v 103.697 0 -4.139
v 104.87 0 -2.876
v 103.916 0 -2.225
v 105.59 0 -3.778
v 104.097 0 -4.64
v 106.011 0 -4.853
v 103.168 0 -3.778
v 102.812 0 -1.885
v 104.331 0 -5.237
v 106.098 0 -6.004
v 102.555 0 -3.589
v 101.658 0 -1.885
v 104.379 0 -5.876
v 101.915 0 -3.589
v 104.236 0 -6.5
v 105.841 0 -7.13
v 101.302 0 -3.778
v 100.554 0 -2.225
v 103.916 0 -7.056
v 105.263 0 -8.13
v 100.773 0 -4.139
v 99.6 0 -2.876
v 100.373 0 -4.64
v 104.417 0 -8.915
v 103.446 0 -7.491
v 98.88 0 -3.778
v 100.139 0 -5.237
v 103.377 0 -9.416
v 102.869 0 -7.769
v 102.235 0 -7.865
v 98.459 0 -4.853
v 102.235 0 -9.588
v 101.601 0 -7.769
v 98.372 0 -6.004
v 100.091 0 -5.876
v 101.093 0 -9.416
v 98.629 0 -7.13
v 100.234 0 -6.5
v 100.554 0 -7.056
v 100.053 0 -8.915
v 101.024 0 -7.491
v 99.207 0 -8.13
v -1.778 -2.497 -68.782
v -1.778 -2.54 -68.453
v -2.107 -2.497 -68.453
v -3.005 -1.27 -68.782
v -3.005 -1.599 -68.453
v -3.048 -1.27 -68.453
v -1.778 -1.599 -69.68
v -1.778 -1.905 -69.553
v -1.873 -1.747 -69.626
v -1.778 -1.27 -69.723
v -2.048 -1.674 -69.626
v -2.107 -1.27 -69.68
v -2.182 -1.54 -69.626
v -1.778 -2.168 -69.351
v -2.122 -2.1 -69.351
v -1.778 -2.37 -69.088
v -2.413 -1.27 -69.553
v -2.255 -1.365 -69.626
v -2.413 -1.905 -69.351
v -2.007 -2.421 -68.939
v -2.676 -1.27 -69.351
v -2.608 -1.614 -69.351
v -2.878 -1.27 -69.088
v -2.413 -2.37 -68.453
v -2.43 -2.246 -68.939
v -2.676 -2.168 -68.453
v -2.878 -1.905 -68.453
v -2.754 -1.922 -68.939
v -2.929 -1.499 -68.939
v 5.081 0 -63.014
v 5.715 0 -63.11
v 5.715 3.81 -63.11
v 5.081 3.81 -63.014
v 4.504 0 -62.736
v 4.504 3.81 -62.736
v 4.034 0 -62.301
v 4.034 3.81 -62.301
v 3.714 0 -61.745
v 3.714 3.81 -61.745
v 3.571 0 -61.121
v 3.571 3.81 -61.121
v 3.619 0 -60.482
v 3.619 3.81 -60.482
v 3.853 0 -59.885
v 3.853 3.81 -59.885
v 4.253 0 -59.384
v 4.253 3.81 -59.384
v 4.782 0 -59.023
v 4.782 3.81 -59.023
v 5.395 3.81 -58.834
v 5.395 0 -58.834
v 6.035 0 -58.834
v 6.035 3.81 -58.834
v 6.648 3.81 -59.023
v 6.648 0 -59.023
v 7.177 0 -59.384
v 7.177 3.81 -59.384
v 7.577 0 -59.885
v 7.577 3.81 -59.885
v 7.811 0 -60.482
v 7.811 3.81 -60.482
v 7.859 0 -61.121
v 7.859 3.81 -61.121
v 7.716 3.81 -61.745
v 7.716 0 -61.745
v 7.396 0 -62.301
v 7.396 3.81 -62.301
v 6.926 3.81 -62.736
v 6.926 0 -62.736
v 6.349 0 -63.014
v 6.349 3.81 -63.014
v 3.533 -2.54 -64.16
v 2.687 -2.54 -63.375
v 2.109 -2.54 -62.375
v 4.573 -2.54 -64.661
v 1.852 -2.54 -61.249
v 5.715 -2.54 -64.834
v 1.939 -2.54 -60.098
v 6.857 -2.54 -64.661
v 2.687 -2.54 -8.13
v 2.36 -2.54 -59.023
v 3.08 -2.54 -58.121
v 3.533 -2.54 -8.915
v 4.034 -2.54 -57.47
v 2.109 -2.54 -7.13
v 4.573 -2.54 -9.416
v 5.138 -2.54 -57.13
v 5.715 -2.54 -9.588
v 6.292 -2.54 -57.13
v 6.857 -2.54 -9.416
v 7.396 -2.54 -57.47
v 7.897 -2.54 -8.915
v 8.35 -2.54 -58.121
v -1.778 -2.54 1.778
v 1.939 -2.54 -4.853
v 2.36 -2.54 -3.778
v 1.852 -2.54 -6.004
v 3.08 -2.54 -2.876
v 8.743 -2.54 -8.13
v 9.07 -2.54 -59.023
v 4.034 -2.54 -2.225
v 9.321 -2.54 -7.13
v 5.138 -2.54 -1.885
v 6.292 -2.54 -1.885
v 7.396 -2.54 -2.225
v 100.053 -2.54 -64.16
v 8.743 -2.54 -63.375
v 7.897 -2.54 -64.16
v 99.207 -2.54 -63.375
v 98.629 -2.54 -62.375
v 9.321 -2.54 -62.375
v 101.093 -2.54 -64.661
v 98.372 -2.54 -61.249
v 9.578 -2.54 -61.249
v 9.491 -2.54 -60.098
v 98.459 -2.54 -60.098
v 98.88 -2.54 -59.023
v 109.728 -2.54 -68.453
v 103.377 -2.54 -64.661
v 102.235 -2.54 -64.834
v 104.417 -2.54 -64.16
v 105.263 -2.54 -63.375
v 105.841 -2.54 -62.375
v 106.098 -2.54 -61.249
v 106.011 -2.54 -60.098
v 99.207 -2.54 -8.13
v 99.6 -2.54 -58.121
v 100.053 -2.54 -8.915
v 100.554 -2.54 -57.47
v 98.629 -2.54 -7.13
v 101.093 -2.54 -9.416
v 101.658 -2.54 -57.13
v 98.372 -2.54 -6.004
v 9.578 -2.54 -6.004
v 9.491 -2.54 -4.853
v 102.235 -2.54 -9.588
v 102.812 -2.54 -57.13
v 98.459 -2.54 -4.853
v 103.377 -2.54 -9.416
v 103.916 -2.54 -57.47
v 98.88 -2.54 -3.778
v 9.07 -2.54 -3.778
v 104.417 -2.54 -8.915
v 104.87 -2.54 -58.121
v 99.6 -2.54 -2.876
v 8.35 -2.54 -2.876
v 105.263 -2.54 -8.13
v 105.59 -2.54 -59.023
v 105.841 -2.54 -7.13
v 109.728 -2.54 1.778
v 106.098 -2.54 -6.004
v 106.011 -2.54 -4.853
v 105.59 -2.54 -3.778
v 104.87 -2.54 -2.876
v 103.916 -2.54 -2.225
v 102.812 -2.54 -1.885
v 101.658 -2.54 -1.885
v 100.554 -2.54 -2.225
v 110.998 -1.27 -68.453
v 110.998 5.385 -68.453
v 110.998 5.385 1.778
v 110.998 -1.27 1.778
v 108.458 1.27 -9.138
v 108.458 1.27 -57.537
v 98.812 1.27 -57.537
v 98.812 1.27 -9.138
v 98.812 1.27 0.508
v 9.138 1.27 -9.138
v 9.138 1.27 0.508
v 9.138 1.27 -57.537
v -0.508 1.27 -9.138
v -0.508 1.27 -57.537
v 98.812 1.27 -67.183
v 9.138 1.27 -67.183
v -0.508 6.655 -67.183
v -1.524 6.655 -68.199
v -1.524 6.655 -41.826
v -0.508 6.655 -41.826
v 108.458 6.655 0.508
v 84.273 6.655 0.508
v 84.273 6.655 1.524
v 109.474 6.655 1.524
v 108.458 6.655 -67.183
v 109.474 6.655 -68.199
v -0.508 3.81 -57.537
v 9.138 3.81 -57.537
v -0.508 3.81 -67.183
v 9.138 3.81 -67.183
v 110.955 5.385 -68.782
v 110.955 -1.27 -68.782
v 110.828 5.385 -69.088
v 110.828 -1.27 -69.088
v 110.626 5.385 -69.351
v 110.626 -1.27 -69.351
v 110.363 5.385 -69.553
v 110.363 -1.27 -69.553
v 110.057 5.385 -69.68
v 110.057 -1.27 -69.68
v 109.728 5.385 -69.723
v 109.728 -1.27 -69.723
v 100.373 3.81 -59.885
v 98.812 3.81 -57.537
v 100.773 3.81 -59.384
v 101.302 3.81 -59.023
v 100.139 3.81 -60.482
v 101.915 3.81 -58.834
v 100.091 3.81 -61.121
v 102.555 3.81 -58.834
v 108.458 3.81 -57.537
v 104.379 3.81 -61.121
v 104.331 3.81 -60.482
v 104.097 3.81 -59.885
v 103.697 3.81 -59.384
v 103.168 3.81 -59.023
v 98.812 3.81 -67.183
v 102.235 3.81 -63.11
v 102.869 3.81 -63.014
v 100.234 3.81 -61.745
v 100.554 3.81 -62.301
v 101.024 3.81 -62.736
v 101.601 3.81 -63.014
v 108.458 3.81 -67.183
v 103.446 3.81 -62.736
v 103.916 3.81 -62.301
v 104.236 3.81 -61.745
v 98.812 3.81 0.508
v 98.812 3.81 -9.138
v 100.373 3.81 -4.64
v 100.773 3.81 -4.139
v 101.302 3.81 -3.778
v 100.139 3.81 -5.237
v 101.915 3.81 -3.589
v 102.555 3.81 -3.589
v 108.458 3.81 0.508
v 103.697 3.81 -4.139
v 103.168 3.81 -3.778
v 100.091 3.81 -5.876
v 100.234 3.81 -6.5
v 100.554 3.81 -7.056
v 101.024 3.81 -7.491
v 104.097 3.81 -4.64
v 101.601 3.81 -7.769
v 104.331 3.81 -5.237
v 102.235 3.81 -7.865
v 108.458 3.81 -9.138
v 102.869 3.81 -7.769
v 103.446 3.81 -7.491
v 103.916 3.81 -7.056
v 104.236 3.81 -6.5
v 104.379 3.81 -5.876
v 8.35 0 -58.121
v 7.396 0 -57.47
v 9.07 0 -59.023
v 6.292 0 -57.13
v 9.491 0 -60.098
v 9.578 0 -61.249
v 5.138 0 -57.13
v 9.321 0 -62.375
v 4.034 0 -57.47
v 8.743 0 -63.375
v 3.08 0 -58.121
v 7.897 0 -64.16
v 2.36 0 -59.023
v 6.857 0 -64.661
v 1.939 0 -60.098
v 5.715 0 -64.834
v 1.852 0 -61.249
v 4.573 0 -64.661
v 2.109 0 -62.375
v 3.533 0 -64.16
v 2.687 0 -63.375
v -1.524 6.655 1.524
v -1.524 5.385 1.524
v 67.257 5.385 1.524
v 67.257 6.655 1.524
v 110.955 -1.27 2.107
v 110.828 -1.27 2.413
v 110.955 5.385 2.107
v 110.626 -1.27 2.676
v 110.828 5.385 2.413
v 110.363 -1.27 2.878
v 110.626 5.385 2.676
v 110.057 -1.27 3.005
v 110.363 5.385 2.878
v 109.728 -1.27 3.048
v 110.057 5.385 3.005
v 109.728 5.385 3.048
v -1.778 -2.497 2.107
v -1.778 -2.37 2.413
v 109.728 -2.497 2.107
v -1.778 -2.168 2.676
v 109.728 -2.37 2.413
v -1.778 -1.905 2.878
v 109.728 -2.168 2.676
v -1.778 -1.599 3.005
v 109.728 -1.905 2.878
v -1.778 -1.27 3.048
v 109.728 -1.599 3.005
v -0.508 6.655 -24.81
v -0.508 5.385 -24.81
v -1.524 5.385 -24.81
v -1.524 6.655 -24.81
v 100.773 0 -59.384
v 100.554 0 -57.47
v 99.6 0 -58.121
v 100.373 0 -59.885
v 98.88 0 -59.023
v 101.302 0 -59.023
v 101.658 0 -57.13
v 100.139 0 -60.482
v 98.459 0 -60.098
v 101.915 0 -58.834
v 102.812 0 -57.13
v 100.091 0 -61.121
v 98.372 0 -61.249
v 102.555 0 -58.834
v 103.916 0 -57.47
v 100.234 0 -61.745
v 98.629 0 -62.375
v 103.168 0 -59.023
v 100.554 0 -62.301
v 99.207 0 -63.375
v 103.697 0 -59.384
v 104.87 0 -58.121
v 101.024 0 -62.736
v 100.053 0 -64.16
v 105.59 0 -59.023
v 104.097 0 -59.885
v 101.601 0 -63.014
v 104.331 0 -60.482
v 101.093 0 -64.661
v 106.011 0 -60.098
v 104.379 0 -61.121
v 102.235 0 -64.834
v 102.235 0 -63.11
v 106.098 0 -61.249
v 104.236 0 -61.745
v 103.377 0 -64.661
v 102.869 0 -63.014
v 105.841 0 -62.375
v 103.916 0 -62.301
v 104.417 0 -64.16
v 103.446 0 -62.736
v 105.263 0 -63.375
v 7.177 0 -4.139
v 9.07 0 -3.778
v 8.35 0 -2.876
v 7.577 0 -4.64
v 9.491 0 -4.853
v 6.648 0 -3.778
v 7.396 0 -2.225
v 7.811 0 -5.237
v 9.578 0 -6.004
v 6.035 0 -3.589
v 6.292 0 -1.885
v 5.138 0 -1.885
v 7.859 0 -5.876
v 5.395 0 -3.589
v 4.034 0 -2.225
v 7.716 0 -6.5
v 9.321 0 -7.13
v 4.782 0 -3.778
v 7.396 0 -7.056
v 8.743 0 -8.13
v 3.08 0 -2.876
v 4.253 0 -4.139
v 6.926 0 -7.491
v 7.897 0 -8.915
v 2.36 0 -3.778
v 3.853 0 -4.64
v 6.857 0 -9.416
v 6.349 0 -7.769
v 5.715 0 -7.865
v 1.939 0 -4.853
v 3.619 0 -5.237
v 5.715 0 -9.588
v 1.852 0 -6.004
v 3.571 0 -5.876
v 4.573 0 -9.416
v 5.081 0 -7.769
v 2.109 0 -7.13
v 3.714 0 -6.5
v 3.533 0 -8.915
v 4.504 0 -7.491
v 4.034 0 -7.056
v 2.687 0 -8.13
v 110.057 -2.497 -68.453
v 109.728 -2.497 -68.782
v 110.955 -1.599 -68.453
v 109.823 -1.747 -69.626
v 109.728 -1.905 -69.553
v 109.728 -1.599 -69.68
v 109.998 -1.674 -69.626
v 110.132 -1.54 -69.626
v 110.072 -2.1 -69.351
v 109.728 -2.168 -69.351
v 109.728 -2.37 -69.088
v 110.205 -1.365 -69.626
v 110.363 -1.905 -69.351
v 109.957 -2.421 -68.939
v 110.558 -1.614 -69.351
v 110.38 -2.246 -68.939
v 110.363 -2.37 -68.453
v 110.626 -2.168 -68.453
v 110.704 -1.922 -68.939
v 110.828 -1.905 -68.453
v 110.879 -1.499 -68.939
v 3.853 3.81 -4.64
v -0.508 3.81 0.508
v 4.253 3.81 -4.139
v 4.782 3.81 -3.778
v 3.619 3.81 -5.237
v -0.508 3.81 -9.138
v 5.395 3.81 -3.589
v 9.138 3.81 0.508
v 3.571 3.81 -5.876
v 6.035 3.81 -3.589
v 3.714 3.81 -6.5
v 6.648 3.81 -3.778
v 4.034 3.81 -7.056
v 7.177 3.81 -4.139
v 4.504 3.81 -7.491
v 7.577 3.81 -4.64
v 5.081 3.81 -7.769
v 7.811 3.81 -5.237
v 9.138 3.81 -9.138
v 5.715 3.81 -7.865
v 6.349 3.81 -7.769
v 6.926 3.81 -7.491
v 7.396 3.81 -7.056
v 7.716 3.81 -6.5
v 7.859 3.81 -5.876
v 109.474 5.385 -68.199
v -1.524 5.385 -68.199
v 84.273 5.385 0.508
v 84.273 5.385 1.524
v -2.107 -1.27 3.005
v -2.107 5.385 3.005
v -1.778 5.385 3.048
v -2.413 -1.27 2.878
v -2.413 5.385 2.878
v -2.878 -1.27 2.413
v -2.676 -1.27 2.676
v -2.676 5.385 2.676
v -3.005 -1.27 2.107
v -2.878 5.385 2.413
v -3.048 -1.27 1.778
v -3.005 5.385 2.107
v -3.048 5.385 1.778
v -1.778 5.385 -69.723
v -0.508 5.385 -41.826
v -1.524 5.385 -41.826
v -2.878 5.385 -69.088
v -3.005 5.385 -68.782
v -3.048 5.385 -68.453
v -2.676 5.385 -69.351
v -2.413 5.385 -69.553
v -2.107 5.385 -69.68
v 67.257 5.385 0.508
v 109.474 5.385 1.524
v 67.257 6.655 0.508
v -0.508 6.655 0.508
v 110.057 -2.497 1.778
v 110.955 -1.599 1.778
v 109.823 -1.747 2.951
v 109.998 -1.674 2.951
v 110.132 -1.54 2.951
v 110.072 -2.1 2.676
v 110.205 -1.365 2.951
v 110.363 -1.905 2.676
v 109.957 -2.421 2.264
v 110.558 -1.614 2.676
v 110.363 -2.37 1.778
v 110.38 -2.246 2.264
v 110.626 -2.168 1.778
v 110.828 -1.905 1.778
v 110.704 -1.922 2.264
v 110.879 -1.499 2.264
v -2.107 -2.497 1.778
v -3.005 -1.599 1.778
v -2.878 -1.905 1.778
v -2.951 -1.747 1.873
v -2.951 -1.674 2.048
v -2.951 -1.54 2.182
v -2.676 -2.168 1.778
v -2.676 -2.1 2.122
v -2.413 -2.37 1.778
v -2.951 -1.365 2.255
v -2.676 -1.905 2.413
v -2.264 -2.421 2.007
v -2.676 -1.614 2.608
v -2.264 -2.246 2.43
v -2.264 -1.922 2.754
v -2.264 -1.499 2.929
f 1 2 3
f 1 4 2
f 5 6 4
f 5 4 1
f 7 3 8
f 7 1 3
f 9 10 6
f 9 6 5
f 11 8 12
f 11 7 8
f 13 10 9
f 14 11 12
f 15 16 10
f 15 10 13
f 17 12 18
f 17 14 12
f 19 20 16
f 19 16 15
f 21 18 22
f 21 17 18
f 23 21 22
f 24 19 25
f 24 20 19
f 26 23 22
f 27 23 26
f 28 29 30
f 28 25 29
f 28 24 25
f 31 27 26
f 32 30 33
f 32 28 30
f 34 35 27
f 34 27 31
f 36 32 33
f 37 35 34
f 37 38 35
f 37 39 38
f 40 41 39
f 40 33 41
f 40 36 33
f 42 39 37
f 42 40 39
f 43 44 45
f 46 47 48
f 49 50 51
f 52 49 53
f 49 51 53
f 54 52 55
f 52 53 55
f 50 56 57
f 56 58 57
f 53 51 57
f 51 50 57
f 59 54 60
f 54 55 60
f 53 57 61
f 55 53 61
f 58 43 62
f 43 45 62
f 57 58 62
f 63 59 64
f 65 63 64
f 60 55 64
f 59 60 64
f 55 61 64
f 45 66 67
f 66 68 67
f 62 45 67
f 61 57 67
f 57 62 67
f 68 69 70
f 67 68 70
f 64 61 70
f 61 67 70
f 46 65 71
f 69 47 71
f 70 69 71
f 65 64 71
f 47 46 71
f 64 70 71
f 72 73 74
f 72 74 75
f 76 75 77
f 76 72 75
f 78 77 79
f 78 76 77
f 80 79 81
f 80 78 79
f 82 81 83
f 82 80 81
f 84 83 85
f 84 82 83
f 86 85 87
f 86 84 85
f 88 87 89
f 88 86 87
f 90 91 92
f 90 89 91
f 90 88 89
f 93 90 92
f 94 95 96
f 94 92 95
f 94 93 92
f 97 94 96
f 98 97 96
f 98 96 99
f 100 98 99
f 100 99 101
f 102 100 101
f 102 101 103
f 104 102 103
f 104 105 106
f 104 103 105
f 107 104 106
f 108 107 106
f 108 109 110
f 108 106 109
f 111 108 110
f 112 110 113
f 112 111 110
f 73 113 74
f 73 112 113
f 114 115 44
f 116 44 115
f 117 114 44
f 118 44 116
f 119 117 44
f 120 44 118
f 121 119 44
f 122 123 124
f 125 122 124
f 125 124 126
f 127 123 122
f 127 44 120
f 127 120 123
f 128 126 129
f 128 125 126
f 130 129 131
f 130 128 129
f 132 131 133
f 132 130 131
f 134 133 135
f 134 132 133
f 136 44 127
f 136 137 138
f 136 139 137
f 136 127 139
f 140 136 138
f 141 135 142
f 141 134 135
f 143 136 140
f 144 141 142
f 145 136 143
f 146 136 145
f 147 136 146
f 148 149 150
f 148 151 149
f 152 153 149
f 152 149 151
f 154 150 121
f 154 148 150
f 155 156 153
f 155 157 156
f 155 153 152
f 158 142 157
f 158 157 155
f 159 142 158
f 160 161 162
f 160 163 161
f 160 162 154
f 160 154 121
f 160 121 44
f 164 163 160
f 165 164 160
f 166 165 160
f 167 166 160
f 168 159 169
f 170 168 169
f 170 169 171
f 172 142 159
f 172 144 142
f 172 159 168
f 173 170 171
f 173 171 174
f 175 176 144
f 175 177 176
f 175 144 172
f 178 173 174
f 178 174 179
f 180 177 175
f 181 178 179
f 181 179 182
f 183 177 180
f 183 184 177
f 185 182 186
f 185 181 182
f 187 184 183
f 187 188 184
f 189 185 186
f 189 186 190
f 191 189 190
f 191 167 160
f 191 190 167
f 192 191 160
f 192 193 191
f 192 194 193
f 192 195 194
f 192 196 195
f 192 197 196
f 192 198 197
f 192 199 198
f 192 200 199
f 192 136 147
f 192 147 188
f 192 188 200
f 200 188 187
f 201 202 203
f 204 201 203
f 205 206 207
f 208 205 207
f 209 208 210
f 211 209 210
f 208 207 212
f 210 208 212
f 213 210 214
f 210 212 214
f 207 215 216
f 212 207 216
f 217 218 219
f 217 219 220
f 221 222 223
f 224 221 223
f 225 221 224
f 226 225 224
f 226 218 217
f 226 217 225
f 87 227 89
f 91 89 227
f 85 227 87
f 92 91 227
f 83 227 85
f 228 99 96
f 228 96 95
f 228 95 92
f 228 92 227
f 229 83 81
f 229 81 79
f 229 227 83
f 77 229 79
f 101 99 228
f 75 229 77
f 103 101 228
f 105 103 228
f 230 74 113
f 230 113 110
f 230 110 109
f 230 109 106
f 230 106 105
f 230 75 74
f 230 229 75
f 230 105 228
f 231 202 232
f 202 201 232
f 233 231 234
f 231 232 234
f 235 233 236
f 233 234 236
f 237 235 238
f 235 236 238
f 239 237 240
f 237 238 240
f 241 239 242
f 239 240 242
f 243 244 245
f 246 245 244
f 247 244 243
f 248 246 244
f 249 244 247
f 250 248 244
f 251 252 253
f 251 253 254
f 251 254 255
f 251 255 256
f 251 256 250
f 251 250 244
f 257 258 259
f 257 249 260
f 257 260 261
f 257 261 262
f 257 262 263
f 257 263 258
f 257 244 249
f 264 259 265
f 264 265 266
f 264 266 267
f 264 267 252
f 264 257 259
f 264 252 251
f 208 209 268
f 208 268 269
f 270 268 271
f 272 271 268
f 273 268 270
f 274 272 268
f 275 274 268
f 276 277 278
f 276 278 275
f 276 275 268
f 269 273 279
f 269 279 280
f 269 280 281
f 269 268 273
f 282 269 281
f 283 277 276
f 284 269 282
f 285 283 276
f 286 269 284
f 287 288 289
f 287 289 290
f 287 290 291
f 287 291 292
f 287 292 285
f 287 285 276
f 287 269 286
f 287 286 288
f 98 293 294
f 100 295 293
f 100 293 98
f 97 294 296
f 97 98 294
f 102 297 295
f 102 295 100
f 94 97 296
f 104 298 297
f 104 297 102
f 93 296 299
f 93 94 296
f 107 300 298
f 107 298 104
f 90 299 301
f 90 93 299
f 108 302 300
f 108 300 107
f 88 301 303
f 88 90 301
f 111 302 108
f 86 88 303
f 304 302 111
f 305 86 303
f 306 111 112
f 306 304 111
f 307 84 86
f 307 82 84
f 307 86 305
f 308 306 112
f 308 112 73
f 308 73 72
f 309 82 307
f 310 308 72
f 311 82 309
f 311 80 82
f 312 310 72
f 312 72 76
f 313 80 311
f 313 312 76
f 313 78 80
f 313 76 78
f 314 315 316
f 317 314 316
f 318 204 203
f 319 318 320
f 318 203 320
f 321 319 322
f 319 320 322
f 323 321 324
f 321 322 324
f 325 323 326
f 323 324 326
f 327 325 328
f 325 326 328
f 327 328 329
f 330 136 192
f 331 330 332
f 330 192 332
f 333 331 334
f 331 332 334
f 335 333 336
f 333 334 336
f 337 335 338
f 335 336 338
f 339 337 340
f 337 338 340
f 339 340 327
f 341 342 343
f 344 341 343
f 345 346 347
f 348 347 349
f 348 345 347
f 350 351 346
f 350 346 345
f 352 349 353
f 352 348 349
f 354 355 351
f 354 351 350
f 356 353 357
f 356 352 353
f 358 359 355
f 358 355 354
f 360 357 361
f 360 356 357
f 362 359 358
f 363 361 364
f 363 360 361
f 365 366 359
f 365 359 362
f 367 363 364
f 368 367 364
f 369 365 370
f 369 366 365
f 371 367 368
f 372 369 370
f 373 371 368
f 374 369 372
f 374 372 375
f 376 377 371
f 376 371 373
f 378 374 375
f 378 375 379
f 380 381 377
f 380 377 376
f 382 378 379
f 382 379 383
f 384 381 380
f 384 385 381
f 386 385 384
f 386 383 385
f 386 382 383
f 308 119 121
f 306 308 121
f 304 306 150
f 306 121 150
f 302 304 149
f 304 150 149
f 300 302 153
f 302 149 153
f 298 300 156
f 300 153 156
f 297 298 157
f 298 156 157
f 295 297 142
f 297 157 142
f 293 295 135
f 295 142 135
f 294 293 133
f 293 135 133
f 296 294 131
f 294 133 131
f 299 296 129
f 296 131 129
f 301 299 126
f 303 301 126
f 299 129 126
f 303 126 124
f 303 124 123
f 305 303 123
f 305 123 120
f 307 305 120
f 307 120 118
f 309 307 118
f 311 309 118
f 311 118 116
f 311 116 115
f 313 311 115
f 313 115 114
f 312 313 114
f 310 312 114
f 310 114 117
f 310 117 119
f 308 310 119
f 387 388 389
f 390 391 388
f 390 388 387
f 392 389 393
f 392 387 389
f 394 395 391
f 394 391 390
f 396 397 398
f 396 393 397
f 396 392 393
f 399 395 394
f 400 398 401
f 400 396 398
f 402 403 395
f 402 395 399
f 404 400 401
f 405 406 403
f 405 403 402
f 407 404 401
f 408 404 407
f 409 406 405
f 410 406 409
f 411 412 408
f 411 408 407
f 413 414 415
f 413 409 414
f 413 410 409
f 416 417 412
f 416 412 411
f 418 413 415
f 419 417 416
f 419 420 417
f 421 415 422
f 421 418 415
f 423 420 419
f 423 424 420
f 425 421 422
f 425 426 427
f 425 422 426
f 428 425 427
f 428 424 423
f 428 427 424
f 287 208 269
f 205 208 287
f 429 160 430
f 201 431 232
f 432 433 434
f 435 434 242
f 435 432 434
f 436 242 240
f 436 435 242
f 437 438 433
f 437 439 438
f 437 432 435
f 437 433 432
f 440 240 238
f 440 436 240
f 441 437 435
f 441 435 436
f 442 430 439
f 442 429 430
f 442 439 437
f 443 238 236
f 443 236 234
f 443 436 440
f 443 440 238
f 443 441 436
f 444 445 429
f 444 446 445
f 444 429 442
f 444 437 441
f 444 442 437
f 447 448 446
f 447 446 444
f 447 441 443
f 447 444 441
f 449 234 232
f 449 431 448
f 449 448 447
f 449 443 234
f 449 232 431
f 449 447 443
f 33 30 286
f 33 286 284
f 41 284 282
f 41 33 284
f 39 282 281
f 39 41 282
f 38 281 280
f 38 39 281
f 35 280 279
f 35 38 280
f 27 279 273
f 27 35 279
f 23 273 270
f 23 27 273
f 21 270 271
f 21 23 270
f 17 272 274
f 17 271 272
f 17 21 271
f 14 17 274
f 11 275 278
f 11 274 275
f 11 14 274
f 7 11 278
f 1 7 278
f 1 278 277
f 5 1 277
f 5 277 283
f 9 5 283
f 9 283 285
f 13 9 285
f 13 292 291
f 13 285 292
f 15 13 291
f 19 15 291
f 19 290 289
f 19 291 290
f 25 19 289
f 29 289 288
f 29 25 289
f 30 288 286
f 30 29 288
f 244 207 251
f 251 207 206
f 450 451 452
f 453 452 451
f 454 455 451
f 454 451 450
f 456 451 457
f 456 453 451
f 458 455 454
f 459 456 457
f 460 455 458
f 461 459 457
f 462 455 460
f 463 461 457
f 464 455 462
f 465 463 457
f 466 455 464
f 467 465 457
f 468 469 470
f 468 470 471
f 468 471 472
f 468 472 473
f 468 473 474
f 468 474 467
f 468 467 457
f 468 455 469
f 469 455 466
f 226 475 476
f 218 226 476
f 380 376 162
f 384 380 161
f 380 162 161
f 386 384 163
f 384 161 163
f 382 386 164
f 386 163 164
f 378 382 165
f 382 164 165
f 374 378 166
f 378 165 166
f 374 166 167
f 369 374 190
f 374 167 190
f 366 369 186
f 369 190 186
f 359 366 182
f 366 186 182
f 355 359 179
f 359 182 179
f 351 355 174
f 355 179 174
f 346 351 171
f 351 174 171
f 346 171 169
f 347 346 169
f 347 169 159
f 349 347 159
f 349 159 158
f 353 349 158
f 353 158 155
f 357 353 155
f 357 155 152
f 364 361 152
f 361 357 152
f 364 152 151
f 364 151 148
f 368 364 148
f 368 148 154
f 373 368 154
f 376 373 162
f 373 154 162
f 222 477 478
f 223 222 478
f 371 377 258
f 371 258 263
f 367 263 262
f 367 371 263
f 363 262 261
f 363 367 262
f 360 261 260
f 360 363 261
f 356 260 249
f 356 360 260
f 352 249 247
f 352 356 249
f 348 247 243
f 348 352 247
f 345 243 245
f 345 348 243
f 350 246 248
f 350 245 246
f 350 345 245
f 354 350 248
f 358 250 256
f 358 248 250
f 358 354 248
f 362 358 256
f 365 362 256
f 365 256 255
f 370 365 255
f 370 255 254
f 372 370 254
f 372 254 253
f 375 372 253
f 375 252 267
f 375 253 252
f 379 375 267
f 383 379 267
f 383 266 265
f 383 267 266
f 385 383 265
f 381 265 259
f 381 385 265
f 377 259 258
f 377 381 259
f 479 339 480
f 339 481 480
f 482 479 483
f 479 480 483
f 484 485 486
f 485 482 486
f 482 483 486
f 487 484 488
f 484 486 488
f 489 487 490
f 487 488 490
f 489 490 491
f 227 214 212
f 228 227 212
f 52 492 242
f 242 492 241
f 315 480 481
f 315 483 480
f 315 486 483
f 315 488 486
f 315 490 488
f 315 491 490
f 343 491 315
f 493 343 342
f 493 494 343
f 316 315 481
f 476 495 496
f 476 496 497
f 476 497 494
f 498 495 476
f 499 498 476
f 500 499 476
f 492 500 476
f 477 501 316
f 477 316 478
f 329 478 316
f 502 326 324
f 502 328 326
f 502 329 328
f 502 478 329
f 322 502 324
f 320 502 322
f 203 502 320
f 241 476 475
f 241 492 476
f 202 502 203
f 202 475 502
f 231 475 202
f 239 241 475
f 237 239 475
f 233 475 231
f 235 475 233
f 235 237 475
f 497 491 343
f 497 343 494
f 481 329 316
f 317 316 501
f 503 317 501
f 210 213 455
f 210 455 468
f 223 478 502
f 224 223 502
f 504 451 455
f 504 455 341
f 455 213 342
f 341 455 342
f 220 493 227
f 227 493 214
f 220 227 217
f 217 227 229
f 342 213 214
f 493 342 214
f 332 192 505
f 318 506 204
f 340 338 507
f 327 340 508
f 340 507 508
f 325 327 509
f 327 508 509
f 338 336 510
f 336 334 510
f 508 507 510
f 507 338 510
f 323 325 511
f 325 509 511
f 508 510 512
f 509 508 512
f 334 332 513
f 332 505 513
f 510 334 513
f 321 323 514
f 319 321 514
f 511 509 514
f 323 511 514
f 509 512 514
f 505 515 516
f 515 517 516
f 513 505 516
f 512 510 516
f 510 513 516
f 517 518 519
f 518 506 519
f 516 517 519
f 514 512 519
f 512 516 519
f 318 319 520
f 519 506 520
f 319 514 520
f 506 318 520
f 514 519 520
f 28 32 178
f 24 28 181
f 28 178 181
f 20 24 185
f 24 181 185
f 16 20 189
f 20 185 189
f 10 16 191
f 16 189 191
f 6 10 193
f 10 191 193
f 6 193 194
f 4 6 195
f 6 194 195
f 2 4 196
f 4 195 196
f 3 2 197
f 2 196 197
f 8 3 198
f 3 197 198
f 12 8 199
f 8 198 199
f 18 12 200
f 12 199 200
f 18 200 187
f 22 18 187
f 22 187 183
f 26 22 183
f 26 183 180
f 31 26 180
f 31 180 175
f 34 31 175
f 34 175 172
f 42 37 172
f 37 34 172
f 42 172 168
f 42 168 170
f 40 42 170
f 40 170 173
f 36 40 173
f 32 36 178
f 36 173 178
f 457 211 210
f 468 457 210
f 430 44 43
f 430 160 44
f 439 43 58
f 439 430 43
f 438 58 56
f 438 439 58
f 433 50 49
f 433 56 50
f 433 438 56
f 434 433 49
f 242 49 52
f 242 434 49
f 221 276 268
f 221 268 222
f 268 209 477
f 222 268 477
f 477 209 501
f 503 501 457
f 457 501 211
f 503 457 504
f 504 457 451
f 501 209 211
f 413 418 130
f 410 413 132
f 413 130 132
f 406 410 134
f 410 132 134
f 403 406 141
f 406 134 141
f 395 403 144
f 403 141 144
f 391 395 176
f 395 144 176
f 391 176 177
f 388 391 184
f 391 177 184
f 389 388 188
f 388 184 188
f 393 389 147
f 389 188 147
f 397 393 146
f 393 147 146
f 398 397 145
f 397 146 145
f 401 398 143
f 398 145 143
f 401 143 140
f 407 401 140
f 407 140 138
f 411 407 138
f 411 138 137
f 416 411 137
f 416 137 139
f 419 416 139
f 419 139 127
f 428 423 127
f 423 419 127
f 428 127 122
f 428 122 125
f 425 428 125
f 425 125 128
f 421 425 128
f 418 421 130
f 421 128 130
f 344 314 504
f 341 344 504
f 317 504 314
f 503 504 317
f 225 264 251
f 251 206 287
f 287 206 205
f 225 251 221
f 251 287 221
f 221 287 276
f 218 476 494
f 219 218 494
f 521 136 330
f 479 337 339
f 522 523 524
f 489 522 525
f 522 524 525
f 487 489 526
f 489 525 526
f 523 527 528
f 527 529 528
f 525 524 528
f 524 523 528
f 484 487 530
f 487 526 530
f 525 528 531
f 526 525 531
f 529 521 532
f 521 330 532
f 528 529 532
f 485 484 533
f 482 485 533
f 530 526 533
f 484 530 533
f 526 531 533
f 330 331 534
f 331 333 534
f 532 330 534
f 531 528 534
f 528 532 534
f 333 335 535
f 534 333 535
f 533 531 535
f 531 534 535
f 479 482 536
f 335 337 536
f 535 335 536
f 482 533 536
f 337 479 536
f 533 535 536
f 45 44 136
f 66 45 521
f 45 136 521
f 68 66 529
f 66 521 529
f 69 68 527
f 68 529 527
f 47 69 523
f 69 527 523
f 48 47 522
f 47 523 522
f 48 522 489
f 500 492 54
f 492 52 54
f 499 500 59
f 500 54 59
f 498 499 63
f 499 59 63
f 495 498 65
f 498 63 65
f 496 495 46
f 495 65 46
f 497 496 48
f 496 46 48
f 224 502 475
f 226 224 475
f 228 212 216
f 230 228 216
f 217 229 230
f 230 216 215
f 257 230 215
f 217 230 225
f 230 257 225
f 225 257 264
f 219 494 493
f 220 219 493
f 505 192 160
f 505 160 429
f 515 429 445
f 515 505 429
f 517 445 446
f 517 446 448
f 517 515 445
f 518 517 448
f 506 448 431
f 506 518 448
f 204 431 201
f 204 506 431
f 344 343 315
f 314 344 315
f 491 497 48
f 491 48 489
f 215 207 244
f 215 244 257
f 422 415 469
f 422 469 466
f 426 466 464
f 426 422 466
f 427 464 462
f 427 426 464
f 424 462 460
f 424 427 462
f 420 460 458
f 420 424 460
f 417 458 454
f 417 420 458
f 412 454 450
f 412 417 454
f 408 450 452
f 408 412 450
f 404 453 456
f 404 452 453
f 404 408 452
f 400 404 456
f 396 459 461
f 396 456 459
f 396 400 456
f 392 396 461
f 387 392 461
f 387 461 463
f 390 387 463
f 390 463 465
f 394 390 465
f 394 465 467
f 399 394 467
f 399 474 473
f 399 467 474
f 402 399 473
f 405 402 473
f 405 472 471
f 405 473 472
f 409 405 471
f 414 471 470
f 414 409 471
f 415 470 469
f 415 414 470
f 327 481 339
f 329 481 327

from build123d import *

# Parameters (mm, degrees)
SKETCH1_W               = 114.045996948
SKETCH1_H               = 72.771003052
SKETCH1_W_2             = 108.965996948
SKETCH1_H_2             = 67.691003052
BOSS_EXTRUDE1_DEPTH     = 5.3848
SKETCH2_W               = 114.045996948
SKETCH2_H               = 72.771003052
BOSS_EXTRUDE2_DEPTH     = 2.54
SKETCH3_W               = 9.64565
SKETCH3_H               = 9.645653052
BOSS_EXTRUDE3_DEPTH     = 3.81
CUT_EXTRUDE1_DEPTH      = 132.233284578
CUT_EXTRUDE1_DEPTH_BACK = 76.2
SKETCH4_R               = 2.1499957
SKETCH5_R               = 3.8735
CUT_EXTRUDE2_DEPTH      = 2.54
BOSS_EXTRUDE4_DEPTH     = 1.27
BOSS_EXTRUDE5_DEPTH     = 1.27
FILLET1_R               = 1.27


with BuildPart() as part:
    # Sketch1 → Boss-Extrude1 (new body)
    with BuildSketch(Plane(origin=(0, 0, 0), x_dir=(1, 0, 0), z_dir=(0, 1, 0))):
        with Locations((53.974998474, 33.337501526)):
            Rectangle(SKETCH1_W, SKETCH1_H)
        with Locations((53.974998474, 33.337501526)):
            Rectangle(SKETCH1_W_2, SKETCH1_H_2, mode=Mode.SUBTRACT)
    extrude(amount=BOSS_EXTRUDE1_DEPTH)

    # Sketch2 → Boss-Extrude2 (add)
    with BuildSketch(Plane.XZ):
        with Locations((53.974998474, -33.337501526)):
            Rectangle(SKETCH2_W, SKETCH2_H)
    extrude(amount=BOSS_EXTRUDE2_DEPTH)

    # Sketch3 → Boss-Extrude3 (add)
    with BuildSketch(Plane(origin=(0, 0, 0), x_dir=(1, 0, 0), z_dir=(0, 1, 0))):
        with Locations((4.314825, 62.360176526)):
            Rectangle(SKETCH3_W, SKETCH3_H)
        with Locations((103.635171948, 62.360176526)):
            Rectangle(SKETCH3_W, SKETCH3_H)
        with Locations((103.635171948, 4.314826526)):
            Rectangle(SKETCH3_W, SKETCH3_H)
        with Locations((4.314825, 4.314826526)):
            Rectangle(SKETCH3_W, SKETCH3_H)
    extrude(amount=BOSS_EXTRUDE3_DEPTH)

    # Sketch4 → Cut-Extrude1 (cut, two sides: drawn at the far end of the back side and taken through both)
    with BuildSketch(Plane(origin=(0, 3.81, 0), x_dir=(1, 0, 0), z_dir=(0, 1, 0)).offset(-CUT_EXTRUDE1_DEPTH_BACK)):
        with Locations(Location((5.715, 60.96, 0), (0, 0, 90))):
            Circle(SKETCH4_R)
        with Locations(Location((5.715, 5.715, 0), (0, 0, 90))):
            Circle(SKETCH4_R)
        with Locations(Location((102.235, 5.715, 0), (0, 0, 90))):
            Circle(SKETCH4_R)
        with Locations(Location((102.235, 60.96, 0), (0, 0, 90))):
            Circle(SKETCH4_R)
    extrude(amount=CUT_EXTRUDE1_DEPTH + CUT_EXTRUDE1_DEPTH_BACK, mode=Mode.SUBTRACT)

    # Sketch5 → Cut-Extrude2 (cut)
    with BuildSketch(Plane.XZ.offset(2.54)):
        with Locations(Location((5.715, -60.96, 0), (0, 0, 270))):
            Circle(SKETCH5_R)
        with Locations(Location((5.715, -5.715, 0), (0, 0, 270))):
            Circle(SKETCH5_R)
        with Locations(Location((102.235, -60.96, 0), (0, 0, 270))):
            Circle(SKETCH5_R)
        with Locations(Location((102.235, -5.715, 0), (0, 0, 270))):
            Circle(SKETCH5_R)
    extrude(amount=-CUT_EXTRUDE2_DEPTH, mode=Mode.SUBTRACT)

    # Sketch6 → Boss-Extrude4 (add)
    with BuildSketch(Plane(origin=(0, 0, 0), x_dir=(1, 0, 0), z_dir=(0, 1, 0))):
        Polygon((9.13765, 67.183003052), (98.812346948, 67.183003052), (98.812346948, 57.53735), (108.457996948, 57.53735), (108.457996948, 9.137653052), (98.812346948, 9.137653052), (98.812346948, -0.508), (9.13765, -0.508), (9.13765, 9.137653052), (-0.508, 9.137653052), (-0.508, 57.53735), (9.13765, 57.53735), align=None)
    extrude(amount=BOSS_EXTRUDE4_DEPTH)

    # Sketch7 → Boss-Extrude5 (add)
    with BuildSketch(Plane(origin=(0, 5.3848, 0), x_dir=(1, 0, 0), z_dir=(0, 1, 0))):
        Polygon((-0.508, 67.183003052), (108.457996948, 67.183003052), (108.457996948, -0.508), (84.272696176, -0.508), (84.272696176, -1.524), (109.473996948, -1.524), (109.473996948, 68.199003052), (-1.524, 68.199003052), (-1.524, 41.825543933), (-0.508, 41.825543933), align=None)
        Polygon((-0.508, -0.508), (-0.508, 24.809543933), (-1.524, 24.809543933), (-1.524, -1.524), (67.256696176, -1.524), (67.256696176, -0.508), align=None)
    extrude(amount=BOSS_EXTRUDE5_DEPTH)

    # Fillet1
    fillet1_edges = [part.edges().sort_by_distance(p)[0] for p in [
        (110.997996948, -2.54, -33.337501526),
        (53.974998474, -2.54, 3.048),
        (-3.048, -2.54, -33.337501526),
        (53.974998474, -2.54, -69.723003052),
        (-3.048, 1.4224, -69.723003052),
        (110.997996948, 1.4224, -69.723003052),
        (110.997996948, 1.4224, 3.048),
        (-3.048, 1.4224, 3.048),
    ]]
    fillet(fillet1_edges, radius=FILLET1_R)


solid = part.part
